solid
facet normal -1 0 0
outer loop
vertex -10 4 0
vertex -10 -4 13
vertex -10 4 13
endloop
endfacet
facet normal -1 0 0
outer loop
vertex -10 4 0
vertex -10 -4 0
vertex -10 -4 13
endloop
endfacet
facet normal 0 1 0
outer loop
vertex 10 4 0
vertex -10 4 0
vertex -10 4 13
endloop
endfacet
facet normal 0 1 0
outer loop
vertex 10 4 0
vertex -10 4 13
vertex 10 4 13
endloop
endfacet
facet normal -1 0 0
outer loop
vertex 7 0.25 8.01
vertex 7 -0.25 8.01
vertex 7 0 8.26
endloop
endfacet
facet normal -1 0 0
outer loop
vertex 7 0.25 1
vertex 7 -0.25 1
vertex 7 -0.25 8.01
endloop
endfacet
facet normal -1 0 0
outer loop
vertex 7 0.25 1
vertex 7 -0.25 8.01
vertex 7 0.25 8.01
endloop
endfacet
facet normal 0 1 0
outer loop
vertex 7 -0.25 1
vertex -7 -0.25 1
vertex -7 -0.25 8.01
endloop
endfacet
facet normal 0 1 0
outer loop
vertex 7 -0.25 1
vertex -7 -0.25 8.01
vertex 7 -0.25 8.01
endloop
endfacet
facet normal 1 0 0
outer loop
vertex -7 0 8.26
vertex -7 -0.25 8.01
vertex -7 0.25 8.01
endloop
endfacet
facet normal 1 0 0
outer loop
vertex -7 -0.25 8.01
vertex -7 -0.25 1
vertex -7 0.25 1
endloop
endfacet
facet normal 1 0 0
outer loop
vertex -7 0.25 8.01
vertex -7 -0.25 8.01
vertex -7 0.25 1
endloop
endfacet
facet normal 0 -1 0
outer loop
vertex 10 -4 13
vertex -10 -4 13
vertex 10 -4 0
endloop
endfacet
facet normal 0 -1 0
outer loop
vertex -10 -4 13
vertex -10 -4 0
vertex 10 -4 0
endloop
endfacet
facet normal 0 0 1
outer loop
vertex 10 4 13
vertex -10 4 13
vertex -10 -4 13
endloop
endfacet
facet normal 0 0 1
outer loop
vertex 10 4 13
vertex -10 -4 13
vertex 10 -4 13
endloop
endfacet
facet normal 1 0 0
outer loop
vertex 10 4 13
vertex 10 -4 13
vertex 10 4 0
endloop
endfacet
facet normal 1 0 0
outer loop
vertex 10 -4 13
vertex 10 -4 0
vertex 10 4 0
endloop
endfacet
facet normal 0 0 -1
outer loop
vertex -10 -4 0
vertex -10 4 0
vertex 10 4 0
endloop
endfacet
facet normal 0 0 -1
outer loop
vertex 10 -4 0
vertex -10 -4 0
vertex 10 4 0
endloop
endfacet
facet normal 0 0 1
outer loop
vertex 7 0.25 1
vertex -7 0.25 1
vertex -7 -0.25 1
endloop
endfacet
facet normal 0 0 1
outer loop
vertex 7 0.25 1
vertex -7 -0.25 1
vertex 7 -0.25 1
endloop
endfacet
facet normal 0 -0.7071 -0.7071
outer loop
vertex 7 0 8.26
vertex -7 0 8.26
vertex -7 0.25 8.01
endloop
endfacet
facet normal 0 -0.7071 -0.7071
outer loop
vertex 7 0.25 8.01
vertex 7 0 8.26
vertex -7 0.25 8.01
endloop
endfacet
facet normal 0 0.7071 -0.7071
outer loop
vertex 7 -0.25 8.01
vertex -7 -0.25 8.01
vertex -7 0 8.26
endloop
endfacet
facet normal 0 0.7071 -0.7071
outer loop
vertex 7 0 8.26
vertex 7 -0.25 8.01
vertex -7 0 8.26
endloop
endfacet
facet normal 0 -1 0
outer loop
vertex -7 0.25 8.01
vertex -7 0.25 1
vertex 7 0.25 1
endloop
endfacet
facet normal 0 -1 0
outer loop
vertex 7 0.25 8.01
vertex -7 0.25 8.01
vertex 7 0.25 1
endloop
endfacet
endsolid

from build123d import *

# Parameters (mm, degrees)
F0_W     = 20
F0_H     = 8
F1_DEPTH = 1
F2_W     = 20
F2_H     = 8
F2_W_2   = 14
F2_H_2   = 0.5
F3_DEPTH = 10
F6_DEPTH = 14
F7_W     = 20
F7_H     = 8
F8_DEPTH = 2


with BuildPart() as f1:
    # F0 (on Top) → F1 (new body)
    with BuildSketch(Plane.XY):
        Rectangle(F0_W, F0_H)
    extrude(amount=F1_DEPTH)

    # F2 (on face) → F3 (join)
    with BuildSketch(Plane.XY.offset(1)):
        Rectangle(F2_W, F2_H)
        Rectangle(F2_W_2, F2_H_2, mode=Mode.SUBTRACT)
    extrude(amount=F3_DEPTH)

    # F5 (on face) → F6 (join, through all)
    with BuildSketch(Plane.YZ.offset(-7)):
        Polygon((0, 8.26), (0.25, 8.01), (0.25, 8.51), align=None)
        Polygon((-0.25, 8.01), (0, 8.26), (-0.25, 8.51), align=None)
        Polygon((-0.25, 8.51), (0, 8.26), (0.25, 8.51), (0.25, 11), (-0.25, 11), align=None)
        Polygon((0.25, 11), (0.25, 8.51), (2.74, 11), align=None)
        Polygon((-2.74, 11), (-0.25, 8.51), (-0.25, 11), align=None)
    extrude(amount=F6_DEPTH)

    # F7 (on face) → F8 (join)
    with BuildSketch(Plane.XY.offset(11)):
        Rectangle(F7_W, F7_H)
    extrude(amount=F8_DEPTH)


solid = f1.part
